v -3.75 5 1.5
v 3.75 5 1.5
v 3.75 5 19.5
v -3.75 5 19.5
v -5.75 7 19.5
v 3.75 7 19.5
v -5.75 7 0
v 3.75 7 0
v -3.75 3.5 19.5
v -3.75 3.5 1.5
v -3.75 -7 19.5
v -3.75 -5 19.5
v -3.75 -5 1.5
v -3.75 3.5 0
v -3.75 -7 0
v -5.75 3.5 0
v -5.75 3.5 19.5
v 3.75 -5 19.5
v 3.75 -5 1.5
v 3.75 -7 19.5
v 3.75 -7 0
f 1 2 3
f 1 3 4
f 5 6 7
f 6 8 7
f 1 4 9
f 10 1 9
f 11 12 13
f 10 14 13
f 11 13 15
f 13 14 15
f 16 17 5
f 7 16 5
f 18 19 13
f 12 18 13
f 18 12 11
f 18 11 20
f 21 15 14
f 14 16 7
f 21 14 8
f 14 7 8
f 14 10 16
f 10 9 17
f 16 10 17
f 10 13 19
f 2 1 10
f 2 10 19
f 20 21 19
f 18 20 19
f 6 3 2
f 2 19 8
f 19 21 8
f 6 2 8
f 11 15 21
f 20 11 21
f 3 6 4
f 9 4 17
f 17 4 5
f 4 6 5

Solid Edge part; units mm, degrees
sketch "Sketch1" plane through (0, 0, 0) normal (0, 0, 1) x (1, 0, 0)
  line L0 (-3.75, -7) -> (3.75, -7)
  line L1 (3.75, -7) -> (3.75, 7)
  line L2 (3.75, 7) -> (-3.75, 7)
  line L3 (-3.75, 7) -> (-3.75, -7)
  dimension "D1" = 14
  dimension "D2" = 7.5
extrude "Protrusion1" add sketch "Sketch1" along normal blind 1.5
sketch "Sketch2" plane through (0, 0, 1.5) normal (0, 0, 1) x (1, 0, 0)
  line L0 (-3.75, 7) -> (3.75, 7)
  line L1 (3.75, 7) -> (3.75, 5)
  line L2 (3.75, 5) -> (-3.75, 5)
  line L3 (-3.75, 5) -> (-3.75, 7)
  line L4 (-3.75, -7) -> (3.75, -7)
  line L5 (3.75, -7) -> (3.75, -5)
  line L6 (3.75, -5) -> (-3.75, -5)
  line L7 (-3.75, -5) -> (-3.75, -7)
  dimension "D1" = 2
  dimension "D2" = 2
extrude "Extrusionsausprägung_2" add sketch "Sketch2" along normal blind 18
sketch "Sketch3" plane through (0, 6, 19.5) normal (0, 0, 1) x (0, 1, 0)
  line L0 (1, 3.75) -> (-2.5, 3.75)
  line L1 (-2.5, 3.75) -> (-2.5, 5.75)
  line L2 (-2.5, 5.75) -> (1, 5.75)
  line L3 (1, 5.75) -> (1, 3.75)
  dimension "D1" = 2
  dimension "D2" = 3.5
extrude "Protrusion2" add sketch "Sketch3" against normal up to vertex (19.5 mm away)
properties material "Nylon, allgemein"
